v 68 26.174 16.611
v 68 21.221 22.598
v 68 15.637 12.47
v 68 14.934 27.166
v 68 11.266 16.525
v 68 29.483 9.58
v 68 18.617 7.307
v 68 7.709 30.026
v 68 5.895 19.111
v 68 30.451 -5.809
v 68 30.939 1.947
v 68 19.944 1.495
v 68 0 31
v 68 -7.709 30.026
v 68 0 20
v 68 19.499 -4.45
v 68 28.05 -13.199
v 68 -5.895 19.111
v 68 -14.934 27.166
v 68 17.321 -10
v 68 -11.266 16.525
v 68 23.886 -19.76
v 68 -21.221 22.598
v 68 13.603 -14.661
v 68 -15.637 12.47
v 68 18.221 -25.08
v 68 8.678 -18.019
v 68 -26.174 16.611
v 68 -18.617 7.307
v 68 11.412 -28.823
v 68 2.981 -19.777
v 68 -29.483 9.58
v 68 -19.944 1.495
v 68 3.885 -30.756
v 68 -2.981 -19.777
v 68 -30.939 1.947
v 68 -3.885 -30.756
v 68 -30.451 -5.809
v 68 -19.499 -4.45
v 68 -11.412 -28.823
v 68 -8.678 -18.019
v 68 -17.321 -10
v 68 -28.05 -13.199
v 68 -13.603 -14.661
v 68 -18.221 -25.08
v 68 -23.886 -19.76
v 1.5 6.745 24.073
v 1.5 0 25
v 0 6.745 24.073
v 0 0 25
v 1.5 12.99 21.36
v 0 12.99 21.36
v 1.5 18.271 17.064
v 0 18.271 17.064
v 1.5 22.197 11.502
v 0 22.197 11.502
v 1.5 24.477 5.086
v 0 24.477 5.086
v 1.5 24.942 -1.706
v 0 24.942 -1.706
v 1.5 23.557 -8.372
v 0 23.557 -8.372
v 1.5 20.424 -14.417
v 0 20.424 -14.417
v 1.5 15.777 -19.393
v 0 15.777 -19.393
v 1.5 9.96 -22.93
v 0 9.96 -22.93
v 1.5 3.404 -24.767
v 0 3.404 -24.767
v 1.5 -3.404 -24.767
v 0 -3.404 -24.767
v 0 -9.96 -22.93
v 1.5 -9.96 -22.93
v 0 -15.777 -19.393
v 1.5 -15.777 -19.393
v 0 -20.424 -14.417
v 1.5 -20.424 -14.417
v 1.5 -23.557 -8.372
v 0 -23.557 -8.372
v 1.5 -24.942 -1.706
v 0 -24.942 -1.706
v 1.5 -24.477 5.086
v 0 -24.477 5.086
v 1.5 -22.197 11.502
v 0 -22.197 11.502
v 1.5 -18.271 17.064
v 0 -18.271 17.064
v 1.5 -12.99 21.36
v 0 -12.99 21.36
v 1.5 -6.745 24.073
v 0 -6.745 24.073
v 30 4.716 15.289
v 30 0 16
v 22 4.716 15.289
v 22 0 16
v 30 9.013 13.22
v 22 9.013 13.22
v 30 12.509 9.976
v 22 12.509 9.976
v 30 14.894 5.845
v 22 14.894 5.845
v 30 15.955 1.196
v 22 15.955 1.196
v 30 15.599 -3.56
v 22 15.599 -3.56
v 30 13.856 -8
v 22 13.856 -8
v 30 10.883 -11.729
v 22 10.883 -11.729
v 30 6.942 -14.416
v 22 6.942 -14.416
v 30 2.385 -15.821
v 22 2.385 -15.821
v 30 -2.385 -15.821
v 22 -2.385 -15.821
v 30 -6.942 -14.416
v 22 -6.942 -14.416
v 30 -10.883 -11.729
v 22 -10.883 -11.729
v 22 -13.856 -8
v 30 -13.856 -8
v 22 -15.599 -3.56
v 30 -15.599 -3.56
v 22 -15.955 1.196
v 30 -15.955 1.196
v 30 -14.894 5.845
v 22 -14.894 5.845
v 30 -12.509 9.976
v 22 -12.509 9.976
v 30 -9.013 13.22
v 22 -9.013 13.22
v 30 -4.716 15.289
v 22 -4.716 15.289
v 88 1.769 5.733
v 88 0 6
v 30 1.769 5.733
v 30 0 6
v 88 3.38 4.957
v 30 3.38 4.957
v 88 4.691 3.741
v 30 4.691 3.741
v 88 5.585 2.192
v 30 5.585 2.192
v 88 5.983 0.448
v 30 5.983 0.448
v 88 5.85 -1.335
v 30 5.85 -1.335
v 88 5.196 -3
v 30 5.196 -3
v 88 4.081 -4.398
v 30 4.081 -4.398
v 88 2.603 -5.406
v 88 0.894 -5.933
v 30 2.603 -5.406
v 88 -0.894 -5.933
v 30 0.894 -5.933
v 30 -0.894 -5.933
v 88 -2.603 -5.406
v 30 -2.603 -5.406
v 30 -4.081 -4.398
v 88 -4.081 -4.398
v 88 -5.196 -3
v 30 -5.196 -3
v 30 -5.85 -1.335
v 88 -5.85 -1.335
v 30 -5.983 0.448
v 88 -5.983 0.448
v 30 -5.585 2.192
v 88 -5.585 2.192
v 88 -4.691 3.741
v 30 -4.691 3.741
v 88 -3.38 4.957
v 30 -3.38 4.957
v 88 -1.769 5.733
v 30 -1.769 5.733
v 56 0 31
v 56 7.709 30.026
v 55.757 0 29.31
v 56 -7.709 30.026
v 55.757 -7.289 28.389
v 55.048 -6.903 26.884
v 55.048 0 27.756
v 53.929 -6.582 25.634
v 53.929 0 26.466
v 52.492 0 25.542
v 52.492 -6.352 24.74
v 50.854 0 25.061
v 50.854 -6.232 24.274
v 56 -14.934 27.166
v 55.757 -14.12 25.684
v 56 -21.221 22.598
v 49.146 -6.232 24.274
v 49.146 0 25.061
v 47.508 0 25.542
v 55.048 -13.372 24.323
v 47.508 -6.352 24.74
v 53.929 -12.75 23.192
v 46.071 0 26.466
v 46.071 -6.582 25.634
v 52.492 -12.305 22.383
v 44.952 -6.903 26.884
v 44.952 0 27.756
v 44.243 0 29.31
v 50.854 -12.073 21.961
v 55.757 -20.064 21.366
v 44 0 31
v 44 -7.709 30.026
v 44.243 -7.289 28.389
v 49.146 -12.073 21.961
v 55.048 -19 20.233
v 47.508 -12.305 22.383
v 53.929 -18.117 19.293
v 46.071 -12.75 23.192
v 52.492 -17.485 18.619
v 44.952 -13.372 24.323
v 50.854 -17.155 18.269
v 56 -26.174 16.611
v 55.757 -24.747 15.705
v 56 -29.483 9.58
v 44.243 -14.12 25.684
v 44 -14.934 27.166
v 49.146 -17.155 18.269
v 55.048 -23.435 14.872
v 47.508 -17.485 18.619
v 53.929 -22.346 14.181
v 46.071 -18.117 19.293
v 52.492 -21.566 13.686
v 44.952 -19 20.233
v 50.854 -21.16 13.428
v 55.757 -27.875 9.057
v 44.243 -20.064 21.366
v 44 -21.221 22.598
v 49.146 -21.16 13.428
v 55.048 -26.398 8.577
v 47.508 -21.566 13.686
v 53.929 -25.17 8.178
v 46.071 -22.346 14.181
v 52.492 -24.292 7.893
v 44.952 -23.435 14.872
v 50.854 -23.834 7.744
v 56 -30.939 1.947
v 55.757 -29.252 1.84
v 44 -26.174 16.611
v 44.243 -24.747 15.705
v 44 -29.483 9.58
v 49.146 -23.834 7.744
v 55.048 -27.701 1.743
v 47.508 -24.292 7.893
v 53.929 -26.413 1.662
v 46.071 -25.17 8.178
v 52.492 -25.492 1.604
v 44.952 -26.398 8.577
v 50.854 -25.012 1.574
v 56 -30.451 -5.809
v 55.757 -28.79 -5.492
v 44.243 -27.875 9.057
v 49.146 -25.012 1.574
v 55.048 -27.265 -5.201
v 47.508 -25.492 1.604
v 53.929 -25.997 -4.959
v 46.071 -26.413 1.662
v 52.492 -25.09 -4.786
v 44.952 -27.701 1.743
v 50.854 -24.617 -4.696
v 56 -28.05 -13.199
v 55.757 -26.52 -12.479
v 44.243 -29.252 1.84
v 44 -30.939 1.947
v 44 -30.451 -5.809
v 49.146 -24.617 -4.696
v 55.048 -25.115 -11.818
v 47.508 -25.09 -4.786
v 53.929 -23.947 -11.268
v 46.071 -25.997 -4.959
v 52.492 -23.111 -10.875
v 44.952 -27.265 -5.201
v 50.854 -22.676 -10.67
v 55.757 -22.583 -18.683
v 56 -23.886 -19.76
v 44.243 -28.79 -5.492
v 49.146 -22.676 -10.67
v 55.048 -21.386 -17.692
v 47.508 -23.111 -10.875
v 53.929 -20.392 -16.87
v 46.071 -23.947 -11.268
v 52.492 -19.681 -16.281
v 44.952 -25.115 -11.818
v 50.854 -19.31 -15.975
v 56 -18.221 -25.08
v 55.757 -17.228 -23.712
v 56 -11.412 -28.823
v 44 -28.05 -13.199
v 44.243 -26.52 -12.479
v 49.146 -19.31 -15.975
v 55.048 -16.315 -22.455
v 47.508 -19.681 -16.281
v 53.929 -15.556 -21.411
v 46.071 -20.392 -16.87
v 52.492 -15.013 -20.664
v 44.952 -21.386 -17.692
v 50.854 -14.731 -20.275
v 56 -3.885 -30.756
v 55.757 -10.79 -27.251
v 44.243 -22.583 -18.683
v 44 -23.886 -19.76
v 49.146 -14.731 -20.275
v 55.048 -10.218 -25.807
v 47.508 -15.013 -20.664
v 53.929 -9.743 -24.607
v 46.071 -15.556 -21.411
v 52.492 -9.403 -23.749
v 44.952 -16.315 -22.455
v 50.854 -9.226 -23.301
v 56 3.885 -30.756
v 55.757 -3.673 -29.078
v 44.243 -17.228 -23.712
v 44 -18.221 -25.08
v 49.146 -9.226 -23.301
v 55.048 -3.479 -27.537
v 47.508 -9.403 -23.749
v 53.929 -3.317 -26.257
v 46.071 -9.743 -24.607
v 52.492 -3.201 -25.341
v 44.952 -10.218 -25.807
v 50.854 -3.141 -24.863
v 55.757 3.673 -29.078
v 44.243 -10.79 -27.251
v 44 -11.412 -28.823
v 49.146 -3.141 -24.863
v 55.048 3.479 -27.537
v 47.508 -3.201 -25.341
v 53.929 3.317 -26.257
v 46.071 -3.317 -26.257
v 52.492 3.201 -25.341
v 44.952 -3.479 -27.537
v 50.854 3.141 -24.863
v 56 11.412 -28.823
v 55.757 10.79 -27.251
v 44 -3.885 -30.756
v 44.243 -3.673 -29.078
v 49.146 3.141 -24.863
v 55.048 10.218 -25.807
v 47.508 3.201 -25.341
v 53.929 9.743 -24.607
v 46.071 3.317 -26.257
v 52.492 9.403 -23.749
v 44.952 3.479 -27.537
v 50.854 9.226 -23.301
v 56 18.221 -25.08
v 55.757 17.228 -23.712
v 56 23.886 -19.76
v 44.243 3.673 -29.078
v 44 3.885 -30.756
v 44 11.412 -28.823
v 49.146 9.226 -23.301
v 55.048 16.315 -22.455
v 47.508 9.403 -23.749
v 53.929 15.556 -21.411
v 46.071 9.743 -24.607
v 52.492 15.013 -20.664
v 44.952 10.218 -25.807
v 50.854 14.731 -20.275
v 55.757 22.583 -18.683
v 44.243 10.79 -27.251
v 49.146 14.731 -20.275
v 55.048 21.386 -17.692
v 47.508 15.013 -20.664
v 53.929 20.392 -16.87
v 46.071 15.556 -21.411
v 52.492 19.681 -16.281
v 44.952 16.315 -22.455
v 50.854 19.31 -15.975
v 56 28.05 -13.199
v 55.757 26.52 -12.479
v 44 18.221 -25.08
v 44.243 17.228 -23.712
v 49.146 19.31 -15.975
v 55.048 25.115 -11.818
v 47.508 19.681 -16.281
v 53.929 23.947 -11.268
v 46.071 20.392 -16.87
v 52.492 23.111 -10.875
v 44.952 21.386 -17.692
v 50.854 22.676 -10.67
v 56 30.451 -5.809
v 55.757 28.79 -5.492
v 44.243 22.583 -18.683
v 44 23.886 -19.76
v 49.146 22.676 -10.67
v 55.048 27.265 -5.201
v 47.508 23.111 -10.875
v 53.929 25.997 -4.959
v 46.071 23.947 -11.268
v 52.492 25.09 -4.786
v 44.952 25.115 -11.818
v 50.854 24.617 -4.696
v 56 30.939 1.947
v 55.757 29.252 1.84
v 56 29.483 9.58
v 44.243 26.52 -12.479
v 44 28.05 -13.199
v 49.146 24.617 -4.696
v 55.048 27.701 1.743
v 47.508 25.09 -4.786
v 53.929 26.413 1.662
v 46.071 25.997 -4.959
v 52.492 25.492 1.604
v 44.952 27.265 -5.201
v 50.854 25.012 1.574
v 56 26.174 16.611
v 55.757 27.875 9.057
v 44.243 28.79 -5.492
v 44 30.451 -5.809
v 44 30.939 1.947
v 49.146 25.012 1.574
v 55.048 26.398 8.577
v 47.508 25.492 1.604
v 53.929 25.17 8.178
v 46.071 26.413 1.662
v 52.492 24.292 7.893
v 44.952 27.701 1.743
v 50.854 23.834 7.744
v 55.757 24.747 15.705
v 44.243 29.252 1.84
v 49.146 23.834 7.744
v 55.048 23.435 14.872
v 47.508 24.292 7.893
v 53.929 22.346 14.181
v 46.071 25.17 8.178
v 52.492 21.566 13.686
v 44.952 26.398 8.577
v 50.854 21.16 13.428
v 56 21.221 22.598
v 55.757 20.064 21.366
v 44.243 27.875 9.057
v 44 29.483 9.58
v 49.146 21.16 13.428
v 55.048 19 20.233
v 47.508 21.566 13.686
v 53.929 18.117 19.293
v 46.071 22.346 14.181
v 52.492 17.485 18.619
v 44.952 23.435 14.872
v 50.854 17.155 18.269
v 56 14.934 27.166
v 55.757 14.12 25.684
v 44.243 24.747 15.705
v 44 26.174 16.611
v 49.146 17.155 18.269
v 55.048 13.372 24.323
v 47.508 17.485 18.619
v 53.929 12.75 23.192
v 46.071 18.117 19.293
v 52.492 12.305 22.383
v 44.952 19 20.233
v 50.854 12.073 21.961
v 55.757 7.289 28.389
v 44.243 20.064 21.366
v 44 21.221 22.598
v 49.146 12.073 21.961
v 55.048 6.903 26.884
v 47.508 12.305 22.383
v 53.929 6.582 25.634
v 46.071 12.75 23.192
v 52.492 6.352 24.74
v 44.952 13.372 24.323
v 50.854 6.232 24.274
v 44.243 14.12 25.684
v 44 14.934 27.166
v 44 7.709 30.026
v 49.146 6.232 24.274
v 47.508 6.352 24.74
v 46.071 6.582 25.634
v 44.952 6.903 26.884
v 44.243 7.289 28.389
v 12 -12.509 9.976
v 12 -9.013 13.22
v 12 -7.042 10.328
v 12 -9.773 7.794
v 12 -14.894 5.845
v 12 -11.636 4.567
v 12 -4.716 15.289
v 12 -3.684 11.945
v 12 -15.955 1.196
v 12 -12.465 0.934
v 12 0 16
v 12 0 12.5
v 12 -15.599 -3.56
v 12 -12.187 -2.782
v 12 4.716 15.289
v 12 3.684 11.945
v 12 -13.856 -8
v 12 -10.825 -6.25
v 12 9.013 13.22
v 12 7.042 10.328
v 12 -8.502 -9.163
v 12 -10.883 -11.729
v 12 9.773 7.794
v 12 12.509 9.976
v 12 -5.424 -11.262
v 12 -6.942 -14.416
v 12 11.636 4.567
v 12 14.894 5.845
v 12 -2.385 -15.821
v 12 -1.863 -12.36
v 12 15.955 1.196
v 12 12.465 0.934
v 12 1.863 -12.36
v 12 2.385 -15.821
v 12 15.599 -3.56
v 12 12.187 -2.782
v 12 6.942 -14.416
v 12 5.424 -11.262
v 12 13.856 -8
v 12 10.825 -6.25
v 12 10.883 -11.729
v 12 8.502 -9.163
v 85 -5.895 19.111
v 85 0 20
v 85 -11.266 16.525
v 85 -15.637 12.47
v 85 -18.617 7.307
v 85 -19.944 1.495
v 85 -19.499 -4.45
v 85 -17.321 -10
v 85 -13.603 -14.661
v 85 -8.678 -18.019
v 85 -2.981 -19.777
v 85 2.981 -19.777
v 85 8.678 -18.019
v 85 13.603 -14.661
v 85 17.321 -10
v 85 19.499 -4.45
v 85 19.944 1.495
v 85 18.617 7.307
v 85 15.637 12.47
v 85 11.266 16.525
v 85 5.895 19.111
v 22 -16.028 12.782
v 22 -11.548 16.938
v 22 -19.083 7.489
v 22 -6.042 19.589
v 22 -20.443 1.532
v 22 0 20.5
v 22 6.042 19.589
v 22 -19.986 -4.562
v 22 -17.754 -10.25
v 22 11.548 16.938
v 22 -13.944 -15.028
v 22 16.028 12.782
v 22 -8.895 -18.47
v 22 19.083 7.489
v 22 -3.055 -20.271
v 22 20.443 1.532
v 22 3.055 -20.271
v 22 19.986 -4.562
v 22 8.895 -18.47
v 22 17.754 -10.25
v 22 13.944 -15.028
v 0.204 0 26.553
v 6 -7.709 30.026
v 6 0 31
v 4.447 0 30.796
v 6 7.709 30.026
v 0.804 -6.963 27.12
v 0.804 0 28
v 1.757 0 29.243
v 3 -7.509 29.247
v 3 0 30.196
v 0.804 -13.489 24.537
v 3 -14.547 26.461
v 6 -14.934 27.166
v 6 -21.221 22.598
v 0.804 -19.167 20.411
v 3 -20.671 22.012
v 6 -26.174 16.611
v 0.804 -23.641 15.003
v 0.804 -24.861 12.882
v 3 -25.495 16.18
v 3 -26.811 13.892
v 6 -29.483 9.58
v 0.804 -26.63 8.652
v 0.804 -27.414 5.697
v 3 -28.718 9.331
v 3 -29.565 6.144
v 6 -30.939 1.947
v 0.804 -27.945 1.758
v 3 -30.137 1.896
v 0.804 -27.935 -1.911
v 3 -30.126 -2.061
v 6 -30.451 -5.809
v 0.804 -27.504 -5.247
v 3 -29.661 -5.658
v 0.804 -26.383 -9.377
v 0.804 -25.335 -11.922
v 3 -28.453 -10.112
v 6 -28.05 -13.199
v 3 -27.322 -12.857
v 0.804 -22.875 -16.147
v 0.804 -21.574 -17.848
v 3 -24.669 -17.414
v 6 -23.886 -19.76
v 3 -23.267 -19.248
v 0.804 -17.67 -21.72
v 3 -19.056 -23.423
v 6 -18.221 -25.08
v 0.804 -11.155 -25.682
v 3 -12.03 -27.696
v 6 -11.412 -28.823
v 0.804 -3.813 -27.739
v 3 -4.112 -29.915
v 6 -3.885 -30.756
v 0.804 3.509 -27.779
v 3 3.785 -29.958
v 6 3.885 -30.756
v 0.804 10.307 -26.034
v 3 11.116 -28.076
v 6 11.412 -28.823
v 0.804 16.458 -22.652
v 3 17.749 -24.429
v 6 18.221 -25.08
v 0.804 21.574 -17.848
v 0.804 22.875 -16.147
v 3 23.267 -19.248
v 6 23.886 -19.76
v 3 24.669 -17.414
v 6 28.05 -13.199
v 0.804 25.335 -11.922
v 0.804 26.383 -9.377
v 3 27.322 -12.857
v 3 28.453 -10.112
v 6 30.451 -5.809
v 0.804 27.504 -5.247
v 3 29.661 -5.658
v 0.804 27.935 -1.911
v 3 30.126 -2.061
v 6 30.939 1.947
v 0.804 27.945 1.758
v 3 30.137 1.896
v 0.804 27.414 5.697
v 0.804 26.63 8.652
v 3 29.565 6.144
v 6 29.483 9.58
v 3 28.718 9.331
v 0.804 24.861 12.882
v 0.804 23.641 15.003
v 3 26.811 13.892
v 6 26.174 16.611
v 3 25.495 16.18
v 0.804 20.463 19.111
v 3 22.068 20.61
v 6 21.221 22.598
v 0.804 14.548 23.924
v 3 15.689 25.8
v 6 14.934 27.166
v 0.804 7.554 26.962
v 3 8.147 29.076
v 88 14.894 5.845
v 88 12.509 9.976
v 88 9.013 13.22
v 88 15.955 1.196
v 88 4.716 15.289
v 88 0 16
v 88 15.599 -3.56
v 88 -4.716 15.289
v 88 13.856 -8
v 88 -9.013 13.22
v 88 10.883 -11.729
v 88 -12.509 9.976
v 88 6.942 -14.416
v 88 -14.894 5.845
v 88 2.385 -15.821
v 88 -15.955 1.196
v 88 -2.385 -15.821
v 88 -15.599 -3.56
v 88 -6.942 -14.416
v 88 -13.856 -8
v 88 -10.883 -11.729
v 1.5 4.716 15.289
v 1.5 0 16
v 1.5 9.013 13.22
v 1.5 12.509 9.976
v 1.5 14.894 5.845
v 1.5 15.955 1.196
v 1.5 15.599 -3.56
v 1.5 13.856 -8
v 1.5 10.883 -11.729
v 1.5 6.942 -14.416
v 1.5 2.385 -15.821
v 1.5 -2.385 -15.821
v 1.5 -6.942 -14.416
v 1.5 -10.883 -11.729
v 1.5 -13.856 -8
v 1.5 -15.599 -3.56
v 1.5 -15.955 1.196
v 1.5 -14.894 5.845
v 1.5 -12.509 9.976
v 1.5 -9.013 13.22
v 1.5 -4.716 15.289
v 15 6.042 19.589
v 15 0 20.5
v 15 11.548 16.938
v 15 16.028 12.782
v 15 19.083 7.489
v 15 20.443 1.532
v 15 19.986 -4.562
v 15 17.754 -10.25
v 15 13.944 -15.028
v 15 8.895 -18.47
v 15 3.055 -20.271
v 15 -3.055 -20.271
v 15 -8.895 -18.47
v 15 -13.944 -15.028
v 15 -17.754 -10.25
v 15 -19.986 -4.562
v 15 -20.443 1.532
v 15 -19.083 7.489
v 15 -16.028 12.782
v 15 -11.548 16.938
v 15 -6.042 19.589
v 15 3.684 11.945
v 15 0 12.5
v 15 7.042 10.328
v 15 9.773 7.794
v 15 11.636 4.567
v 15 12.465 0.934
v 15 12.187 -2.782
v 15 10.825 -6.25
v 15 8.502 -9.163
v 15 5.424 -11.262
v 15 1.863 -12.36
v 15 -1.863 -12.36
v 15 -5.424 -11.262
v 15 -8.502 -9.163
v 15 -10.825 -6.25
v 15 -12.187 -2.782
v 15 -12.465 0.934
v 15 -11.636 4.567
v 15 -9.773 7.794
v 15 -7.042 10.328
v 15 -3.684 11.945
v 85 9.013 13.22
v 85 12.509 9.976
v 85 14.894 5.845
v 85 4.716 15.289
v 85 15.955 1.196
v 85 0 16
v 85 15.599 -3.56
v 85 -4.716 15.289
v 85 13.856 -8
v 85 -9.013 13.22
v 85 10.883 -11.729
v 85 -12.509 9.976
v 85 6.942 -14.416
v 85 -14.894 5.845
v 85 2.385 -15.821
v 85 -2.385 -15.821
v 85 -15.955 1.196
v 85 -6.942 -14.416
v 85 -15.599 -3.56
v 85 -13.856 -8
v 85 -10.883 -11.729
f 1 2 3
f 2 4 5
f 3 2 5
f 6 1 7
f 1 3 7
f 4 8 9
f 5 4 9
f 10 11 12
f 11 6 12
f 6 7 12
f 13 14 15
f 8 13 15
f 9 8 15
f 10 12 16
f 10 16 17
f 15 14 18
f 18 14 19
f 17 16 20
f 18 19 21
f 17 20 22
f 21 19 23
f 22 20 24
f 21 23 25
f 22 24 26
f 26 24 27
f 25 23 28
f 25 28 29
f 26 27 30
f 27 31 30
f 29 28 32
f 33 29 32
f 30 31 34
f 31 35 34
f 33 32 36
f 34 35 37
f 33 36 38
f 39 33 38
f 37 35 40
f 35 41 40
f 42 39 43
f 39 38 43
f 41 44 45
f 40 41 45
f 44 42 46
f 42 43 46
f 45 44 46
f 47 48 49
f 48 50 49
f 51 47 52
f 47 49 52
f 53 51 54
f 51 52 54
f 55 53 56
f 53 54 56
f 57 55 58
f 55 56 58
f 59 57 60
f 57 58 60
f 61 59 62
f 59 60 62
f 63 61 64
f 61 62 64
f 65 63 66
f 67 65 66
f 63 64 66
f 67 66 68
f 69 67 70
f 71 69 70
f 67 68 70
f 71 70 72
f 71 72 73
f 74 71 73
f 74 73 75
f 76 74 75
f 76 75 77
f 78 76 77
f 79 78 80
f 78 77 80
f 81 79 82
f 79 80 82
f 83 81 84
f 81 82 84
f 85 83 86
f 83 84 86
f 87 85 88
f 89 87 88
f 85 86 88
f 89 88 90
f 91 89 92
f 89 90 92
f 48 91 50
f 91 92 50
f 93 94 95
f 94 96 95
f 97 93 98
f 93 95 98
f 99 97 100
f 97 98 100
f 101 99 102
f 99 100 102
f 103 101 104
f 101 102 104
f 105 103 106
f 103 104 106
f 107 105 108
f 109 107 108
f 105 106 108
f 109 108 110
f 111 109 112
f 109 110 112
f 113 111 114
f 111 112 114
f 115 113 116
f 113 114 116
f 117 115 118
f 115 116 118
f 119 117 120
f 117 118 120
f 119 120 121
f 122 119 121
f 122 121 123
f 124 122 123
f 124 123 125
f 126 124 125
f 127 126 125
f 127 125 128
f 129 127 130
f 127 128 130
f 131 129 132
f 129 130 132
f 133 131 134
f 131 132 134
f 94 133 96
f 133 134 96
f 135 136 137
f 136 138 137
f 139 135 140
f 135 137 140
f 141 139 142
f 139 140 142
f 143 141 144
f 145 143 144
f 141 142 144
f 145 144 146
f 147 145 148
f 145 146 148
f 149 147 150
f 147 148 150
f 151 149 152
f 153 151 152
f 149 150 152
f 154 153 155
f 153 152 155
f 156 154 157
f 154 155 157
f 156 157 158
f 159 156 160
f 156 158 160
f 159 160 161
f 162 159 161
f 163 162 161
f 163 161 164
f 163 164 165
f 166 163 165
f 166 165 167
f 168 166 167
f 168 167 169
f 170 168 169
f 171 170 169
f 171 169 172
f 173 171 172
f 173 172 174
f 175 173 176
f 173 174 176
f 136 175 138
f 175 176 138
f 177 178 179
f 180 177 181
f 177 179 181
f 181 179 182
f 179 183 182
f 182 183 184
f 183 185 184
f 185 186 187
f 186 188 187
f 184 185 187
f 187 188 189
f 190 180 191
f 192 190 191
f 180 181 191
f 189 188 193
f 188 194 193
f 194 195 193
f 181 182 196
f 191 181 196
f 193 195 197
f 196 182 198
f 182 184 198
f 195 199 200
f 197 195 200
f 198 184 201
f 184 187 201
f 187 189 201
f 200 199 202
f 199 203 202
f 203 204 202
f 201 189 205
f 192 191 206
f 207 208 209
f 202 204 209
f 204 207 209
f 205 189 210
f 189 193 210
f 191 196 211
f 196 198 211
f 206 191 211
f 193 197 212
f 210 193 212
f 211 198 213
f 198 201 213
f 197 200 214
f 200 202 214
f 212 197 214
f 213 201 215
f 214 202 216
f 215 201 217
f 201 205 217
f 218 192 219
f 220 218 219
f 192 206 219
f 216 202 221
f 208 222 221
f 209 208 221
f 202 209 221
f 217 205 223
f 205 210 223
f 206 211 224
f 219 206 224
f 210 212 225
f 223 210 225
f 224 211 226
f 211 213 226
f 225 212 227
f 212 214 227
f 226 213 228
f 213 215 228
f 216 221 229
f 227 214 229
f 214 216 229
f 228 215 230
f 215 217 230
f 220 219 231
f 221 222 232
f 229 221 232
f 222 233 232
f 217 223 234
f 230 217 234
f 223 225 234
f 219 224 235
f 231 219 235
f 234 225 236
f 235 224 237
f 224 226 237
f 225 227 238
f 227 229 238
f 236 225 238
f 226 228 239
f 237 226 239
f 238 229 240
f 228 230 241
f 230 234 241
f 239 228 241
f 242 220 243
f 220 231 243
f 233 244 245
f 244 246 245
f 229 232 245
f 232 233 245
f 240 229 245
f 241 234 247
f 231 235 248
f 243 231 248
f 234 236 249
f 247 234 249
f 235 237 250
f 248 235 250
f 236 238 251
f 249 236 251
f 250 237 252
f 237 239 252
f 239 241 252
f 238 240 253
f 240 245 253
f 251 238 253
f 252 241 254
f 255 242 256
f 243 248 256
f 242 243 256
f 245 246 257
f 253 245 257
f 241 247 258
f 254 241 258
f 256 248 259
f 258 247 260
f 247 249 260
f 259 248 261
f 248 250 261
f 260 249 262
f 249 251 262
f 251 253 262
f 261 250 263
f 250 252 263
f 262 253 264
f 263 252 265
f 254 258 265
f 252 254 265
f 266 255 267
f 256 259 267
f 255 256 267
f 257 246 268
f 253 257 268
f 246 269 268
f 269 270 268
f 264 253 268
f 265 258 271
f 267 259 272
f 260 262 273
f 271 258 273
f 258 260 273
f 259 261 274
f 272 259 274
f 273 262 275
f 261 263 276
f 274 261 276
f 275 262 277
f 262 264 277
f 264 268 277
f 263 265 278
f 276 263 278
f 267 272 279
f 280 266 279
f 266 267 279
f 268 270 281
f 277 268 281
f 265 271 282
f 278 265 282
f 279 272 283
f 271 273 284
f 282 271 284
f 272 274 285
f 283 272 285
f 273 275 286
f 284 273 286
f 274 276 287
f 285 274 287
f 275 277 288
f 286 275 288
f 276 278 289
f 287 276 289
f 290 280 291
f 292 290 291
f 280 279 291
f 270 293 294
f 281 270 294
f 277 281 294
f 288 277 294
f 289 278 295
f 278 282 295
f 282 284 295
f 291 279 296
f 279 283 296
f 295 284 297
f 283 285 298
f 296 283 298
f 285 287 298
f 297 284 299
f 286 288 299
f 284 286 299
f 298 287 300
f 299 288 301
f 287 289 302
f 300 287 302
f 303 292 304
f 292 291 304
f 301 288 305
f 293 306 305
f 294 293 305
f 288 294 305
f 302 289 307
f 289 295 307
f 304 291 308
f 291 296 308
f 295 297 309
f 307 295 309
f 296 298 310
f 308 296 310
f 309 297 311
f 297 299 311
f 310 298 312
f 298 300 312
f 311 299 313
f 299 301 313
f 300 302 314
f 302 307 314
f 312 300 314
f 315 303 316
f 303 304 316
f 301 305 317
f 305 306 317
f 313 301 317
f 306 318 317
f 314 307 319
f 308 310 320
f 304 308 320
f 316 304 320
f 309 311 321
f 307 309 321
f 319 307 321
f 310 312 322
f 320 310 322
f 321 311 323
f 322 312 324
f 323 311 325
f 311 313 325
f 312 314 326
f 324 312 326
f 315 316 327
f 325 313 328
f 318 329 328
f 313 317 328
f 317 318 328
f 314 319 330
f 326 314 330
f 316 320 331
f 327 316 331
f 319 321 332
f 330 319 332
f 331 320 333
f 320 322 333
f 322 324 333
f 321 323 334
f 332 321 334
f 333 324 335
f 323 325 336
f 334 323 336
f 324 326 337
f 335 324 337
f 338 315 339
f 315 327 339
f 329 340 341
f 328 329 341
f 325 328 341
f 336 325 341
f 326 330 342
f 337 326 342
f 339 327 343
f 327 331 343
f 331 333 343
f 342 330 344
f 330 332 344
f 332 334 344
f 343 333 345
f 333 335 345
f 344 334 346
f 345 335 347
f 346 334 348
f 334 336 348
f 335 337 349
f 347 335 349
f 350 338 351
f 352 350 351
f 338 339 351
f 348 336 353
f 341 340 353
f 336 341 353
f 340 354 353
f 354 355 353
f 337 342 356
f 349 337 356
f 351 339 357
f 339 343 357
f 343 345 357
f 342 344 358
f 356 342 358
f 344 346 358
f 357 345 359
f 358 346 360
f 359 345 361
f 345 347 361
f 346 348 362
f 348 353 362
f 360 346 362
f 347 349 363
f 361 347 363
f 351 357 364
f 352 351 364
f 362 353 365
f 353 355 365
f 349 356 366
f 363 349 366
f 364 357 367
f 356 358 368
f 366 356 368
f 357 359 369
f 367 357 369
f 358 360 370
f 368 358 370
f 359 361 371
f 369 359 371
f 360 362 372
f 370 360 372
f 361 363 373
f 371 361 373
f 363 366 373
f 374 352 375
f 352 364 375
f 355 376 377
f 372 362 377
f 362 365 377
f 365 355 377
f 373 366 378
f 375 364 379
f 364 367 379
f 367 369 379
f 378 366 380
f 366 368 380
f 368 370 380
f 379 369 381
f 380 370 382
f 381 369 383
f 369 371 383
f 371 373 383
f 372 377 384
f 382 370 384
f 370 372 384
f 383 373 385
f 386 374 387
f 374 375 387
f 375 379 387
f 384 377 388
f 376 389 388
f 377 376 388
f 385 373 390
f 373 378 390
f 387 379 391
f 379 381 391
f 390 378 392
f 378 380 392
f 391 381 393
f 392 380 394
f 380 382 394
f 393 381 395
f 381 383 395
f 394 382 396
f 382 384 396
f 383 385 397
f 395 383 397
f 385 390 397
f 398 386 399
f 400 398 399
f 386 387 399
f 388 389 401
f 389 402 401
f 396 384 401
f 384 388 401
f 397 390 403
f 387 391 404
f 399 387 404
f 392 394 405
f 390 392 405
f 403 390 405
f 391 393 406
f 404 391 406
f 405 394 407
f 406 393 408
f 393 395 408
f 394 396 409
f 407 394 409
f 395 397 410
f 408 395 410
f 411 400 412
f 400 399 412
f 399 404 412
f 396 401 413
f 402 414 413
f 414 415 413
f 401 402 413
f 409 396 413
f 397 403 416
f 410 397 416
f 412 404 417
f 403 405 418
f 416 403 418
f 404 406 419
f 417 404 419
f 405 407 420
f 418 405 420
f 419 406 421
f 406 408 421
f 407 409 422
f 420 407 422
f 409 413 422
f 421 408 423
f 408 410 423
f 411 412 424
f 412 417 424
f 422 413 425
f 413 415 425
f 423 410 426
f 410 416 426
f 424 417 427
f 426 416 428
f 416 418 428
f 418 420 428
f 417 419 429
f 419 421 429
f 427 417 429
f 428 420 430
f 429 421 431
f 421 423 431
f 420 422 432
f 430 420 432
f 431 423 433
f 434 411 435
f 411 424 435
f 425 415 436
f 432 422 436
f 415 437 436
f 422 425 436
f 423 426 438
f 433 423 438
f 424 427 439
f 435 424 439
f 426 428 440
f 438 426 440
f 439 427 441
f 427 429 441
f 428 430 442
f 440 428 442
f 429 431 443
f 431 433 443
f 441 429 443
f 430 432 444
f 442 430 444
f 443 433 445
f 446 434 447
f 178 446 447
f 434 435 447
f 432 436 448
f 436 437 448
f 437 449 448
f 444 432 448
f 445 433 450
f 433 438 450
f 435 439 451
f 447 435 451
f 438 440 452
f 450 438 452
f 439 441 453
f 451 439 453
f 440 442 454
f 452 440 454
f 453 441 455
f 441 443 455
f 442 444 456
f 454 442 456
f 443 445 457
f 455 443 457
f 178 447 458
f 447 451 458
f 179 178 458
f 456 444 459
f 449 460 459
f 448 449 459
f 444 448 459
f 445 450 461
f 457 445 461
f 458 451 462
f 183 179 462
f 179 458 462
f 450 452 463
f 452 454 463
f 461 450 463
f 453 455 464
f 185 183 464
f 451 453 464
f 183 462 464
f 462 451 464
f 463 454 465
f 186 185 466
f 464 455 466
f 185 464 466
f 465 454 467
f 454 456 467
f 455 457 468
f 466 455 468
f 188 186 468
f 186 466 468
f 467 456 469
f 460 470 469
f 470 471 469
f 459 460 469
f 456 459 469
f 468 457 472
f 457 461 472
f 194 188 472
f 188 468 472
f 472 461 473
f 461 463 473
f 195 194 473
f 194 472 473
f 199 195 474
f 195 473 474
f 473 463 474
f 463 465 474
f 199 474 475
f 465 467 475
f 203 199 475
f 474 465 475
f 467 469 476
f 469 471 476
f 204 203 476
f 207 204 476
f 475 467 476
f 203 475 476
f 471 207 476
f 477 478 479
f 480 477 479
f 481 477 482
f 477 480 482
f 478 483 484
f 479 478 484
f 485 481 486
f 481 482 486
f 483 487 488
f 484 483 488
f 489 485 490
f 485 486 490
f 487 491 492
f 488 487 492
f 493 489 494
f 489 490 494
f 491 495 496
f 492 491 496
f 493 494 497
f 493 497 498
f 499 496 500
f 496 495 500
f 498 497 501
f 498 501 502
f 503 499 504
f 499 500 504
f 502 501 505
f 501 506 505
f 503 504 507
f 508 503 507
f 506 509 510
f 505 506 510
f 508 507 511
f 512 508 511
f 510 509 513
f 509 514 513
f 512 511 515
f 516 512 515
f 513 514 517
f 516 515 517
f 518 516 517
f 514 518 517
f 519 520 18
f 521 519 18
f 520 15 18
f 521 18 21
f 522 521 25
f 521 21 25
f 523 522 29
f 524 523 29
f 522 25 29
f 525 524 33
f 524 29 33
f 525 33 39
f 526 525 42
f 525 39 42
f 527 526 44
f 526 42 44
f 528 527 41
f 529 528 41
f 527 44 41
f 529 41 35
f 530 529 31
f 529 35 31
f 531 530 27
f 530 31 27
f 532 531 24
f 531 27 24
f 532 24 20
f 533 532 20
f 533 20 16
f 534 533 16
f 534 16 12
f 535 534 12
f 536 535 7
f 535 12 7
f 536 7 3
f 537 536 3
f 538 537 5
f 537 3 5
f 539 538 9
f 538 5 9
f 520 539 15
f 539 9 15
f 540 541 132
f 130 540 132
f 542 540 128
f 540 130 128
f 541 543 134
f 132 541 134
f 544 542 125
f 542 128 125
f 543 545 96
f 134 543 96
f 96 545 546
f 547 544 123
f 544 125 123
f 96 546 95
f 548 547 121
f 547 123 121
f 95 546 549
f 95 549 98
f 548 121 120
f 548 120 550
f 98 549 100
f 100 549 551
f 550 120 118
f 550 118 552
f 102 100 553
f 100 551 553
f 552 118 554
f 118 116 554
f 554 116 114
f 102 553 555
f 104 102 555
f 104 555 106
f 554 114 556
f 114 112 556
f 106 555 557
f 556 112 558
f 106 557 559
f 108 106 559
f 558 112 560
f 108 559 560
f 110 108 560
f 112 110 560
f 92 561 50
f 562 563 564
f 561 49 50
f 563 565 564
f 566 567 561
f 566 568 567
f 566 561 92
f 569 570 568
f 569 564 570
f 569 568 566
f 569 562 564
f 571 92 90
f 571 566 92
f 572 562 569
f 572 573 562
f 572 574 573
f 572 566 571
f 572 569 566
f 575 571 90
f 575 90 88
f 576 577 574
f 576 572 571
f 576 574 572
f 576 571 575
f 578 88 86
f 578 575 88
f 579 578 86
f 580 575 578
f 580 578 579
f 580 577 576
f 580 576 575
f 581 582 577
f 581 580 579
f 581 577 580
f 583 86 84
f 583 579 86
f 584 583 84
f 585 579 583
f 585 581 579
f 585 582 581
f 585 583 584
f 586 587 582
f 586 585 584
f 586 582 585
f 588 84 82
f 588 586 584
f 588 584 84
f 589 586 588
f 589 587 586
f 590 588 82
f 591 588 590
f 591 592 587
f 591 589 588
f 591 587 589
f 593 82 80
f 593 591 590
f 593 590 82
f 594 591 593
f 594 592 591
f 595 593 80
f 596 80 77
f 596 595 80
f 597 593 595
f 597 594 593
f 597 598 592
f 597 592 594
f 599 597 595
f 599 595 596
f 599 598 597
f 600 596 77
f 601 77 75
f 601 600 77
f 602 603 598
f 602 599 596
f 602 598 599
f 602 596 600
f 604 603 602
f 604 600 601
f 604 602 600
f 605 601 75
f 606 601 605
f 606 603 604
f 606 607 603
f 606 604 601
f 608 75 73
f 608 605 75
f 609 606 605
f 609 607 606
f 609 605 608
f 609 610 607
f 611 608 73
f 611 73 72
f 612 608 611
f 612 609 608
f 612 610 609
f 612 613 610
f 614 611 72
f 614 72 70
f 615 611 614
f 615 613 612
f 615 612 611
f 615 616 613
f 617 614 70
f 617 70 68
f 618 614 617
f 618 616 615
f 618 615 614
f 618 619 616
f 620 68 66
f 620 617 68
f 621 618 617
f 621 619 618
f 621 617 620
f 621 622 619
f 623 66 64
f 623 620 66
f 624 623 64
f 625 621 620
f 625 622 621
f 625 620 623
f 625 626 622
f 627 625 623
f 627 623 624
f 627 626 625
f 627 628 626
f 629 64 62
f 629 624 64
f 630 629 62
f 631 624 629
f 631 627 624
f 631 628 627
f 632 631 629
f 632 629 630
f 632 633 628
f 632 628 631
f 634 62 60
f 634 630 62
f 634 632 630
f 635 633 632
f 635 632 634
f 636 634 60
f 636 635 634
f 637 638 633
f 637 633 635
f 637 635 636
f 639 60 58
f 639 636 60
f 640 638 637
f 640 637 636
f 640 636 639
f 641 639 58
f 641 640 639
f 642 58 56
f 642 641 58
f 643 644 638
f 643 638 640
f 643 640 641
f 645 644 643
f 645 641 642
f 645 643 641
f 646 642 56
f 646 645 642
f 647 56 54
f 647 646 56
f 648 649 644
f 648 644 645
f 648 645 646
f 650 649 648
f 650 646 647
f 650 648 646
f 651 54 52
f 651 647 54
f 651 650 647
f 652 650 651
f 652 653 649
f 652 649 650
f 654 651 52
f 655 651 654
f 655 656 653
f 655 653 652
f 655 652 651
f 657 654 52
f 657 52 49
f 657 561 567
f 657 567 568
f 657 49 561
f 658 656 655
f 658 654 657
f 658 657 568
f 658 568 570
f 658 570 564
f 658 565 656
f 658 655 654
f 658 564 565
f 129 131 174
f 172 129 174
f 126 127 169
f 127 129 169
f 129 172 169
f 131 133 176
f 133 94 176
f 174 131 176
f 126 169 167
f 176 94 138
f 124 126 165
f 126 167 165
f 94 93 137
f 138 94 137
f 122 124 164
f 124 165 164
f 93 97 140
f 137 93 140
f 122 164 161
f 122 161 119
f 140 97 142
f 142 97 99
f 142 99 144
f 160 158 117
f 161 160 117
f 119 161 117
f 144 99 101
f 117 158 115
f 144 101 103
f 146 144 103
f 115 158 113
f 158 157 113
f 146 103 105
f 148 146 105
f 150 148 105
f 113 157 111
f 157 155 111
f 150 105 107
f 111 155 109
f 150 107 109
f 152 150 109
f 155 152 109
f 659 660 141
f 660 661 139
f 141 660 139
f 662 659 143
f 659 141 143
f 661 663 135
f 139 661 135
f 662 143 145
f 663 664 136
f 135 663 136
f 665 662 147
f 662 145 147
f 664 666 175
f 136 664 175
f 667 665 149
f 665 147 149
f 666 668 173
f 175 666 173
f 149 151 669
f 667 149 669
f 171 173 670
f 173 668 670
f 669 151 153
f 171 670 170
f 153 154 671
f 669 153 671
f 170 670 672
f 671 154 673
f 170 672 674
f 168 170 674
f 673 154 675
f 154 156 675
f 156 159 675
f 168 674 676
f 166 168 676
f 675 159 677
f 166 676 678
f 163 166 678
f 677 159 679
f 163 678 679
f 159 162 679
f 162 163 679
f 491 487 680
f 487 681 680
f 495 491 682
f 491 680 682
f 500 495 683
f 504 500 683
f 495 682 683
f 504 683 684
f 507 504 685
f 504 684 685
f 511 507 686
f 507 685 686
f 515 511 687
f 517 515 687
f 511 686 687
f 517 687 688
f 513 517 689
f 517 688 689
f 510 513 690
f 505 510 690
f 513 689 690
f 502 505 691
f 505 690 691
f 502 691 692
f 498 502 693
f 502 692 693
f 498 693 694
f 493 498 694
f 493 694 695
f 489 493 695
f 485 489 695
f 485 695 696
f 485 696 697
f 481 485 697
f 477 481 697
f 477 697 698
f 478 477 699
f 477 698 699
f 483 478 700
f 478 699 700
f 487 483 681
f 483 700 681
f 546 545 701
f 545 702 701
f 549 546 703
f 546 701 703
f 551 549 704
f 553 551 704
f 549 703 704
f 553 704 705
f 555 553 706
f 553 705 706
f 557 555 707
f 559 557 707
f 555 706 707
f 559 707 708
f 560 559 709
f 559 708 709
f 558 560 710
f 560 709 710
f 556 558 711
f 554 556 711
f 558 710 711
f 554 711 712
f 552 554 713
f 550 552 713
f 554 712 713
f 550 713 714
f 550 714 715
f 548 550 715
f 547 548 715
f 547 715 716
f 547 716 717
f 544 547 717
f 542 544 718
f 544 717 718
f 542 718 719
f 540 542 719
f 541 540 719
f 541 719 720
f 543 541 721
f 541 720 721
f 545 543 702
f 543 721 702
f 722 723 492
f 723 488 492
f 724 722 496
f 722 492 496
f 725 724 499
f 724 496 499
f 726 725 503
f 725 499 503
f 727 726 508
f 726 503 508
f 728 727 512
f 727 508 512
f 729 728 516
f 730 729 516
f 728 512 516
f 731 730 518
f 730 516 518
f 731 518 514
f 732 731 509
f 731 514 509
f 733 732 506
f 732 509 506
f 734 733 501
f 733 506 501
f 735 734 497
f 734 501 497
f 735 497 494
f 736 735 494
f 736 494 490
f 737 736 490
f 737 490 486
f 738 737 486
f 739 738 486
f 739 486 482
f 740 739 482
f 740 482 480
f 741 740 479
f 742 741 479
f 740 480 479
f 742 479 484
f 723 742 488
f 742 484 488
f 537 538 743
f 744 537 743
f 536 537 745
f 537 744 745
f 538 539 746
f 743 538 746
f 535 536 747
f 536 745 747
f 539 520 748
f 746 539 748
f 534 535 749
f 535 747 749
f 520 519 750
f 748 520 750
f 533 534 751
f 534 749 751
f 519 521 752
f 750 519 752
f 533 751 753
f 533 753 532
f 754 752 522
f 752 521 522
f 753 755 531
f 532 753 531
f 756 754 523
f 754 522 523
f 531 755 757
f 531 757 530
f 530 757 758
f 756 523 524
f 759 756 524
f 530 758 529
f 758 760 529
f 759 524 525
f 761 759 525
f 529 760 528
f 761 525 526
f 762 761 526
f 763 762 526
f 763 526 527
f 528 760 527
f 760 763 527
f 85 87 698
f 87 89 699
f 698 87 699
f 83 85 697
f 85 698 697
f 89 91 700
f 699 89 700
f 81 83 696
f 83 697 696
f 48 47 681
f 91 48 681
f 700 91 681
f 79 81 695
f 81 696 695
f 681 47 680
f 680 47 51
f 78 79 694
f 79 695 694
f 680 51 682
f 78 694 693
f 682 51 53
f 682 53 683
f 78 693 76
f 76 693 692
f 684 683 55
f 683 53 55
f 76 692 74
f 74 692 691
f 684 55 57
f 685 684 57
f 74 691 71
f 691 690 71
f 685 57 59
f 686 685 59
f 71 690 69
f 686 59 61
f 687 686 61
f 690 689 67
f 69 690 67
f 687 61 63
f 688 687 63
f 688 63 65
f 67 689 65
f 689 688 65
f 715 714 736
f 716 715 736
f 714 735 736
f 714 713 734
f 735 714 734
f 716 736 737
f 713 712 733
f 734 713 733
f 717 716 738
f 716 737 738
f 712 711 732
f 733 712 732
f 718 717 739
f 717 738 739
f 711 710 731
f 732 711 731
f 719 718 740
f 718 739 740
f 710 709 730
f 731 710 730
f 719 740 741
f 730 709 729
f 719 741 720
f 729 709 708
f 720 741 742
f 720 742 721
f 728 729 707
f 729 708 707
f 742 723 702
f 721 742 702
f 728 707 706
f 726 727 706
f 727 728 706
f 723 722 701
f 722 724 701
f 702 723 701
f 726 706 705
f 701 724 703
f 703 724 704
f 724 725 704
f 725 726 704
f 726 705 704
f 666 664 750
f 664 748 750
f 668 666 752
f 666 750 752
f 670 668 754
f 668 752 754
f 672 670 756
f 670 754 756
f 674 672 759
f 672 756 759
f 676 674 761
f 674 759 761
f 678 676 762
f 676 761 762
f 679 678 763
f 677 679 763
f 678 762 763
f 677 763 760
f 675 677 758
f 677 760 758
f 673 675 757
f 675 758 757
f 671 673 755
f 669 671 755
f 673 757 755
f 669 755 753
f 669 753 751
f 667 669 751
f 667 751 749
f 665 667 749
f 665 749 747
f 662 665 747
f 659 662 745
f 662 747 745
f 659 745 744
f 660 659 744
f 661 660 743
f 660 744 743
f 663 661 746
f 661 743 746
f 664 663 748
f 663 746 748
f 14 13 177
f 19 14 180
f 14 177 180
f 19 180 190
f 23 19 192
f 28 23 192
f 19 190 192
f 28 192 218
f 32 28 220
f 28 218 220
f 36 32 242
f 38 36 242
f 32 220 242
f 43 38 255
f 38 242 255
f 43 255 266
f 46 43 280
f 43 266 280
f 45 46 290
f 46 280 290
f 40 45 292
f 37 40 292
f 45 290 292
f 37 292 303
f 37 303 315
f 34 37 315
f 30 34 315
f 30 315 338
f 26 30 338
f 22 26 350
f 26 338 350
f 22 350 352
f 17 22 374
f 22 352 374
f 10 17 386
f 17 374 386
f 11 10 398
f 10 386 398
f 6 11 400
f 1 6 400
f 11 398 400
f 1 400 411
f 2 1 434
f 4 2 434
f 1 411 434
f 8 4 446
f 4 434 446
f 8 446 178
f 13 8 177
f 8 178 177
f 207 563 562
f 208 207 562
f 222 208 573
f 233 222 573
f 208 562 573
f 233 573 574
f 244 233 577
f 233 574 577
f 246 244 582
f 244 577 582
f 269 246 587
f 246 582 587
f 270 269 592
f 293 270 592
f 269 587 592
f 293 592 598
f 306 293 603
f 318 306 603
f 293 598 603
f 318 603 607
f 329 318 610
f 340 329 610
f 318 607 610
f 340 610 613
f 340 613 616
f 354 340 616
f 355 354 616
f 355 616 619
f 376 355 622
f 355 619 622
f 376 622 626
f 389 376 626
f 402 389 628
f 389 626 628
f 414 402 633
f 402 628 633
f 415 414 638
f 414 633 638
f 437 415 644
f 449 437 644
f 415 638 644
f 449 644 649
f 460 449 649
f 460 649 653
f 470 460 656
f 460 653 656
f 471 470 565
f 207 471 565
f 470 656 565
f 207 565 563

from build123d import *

# Parameters (mm, degrees)
F4_R = 5.99999


# Not quite as in the source:
# - a fillet or chamfer is up to 0.001 mm smaller than in the source, because OpenCascade refuses the exact size


with BuildPart() as f1:
    # F0 (on Front) → F1 (revolve)
    with BuildSketch(Plane.XZ):
        with BuildLine():
            Line((0, 31), (0, 0))
            Line((0, 0), (88, 0))
            Line((88, 0), (88, 16))
            Line((88, 16), (85, 16))
            Line((85, 16), (85, 20))
            Line((85, 20), (68, 20))
            Line((68, 20), (68, 31))
            Line((68, 31), (56, 31))
            ThreePointArc((56, 31), (50, 25), (44, 31))
            Line((44, 31), (0, 31))
        make_face()
    revolve(axis=Axis((55.6183233857, 0, 0), (1, 0, 0)))

    # F2 (on Front) → F3 (revolve, cut)
    with BuildSketch(Plane.XZ):
        Polygon((0, 25), (0, 0), (88, 0), (88, 6), (30, 6), (30, 16), (22, 16), (22, 20.5), (15, 20.5), (15, 12.5), (12, 12.5), (12, 16), (1.5, 16), (1.5, 25), align=None)
    revolve(axis=Axis((-12.6493745584, 0, 0), (-1, 0, 0)), mode=Mode.SUBTRACT)

    # F4 (radius 6 in the source; OpenCascade refuses exactly that, so slightly less here)
    f4_edges = [f1.edges().sort_by_distance(p)[0] for p in [
        (0, 0, -31),
    ]]
    fillet(f4_edges, radius=F4_R)


solid = f1.part
